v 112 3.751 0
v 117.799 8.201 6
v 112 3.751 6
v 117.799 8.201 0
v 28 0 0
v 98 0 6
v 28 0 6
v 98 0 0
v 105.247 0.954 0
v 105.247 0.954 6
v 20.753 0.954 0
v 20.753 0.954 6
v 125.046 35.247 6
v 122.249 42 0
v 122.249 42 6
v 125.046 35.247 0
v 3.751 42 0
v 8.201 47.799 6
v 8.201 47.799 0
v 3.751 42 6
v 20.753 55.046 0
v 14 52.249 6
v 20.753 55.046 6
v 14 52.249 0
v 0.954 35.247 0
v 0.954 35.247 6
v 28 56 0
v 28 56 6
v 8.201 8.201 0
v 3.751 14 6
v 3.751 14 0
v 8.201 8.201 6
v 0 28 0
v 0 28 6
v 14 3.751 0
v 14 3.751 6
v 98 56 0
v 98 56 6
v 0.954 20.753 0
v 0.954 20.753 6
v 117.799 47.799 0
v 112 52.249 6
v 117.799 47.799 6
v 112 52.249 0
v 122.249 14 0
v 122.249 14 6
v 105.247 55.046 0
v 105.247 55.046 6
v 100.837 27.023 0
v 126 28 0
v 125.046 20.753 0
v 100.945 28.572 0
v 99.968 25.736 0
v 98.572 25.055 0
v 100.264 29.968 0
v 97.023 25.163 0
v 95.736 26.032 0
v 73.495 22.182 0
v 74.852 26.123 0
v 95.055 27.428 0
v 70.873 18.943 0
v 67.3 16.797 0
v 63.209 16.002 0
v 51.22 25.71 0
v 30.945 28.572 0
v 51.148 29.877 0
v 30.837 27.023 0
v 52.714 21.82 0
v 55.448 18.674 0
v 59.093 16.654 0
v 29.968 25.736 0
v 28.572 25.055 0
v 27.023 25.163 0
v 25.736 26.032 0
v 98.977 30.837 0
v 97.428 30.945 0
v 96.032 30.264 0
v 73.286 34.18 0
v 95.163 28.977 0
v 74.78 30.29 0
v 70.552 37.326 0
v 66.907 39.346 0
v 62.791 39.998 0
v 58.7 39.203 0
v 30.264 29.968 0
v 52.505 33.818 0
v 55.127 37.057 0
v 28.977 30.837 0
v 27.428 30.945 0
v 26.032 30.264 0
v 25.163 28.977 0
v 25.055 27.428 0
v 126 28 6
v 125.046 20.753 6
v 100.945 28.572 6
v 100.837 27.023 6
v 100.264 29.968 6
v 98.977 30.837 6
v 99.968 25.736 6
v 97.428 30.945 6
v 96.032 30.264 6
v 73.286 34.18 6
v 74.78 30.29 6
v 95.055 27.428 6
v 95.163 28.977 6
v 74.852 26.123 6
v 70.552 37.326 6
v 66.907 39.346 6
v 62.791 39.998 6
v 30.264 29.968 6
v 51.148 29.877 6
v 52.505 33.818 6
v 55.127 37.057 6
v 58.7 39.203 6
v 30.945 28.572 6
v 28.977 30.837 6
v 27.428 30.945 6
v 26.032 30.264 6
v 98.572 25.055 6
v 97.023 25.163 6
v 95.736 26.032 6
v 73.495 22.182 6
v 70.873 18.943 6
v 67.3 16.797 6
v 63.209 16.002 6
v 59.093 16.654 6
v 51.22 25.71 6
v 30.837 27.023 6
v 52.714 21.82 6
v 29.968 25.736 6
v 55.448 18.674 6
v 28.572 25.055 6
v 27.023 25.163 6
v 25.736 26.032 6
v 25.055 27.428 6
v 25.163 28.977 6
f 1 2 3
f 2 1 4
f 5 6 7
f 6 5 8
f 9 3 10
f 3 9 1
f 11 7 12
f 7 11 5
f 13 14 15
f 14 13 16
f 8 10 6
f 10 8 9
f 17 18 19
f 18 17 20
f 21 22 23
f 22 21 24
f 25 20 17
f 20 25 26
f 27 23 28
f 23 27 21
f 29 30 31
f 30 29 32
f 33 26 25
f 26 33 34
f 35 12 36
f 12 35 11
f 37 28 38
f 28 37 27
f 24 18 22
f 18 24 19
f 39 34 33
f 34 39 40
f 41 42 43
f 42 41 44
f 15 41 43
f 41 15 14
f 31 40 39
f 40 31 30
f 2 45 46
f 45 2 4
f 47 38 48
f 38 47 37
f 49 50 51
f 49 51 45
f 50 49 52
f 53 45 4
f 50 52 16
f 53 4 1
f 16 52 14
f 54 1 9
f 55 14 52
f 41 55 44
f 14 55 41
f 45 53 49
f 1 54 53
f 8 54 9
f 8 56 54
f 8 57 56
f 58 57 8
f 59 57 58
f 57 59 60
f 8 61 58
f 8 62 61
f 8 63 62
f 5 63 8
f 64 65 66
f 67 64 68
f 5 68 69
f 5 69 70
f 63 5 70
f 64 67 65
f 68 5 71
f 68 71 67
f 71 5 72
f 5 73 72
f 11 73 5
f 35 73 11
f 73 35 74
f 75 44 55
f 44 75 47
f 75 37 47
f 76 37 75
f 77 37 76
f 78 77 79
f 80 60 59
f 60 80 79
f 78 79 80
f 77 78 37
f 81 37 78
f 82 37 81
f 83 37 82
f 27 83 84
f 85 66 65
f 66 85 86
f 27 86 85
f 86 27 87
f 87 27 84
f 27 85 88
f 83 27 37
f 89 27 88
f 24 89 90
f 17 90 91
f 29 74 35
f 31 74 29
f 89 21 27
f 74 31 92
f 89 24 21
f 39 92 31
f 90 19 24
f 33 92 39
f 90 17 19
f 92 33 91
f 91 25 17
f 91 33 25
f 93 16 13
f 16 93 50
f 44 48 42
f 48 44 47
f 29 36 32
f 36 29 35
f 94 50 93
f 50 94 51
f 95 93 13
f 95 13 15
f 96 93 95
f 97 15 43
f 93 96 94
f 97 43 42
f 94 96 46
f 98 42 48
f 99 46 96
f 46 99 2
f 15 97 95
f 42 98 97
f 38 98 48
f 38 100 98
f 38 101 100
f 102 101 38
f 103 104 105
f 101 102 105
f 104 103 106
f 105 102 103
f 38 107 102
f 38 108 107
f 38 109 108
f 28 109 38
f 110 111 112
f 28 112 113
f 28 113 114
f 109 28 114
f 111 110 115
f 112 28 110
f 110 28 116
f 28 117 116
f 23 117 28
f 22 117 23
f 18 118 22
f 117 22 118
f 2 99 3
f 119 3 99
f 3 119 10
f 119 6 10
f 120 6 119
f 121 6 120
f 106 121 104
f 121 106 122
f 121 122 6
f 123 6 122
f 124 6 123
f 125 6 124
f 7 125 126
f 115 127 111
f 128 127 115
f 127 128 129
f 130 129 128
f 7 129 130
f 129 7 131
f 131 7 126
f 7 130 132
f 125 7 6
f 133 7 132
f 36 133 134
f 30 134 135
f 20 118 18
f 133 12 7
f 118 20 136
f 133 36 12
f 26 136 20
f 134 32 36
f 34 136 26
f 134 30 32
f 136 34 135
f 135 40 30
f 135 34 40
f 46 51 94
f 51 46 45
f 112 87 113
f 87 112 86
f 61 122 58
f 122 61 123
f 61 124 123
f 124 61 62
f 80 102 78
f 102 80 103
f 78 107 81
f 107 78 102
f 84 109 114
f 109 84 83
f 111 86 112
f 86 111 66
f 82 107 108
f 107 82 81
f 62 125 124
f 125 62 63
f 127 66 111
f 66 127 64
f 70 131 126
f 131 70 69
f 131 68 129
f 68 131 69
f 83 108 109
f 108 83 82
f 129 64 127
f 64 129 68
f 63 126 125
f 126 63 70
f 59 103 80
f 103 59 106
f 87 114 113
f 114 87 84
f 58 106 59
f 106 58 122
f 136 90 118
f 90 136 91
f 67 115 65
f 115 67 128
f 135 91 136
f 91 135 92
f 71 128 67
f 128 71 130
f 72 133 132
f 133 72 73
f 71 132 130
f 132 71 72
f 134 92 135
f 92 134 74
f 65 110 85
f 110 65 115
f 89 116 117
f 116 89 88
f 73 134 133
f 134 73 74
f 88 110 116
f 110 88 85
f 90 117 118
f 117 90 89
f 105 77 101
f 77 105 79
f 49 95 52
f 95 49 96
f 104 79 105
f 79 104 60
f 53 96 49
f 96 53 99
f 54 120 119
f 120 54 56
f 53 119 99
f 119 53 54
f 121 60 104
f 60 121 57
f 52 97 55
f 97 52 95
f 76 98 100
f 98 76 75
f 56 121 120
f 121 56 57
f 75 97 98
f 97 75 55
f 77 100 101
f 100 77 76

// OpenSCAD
$fn = 32;

// ----------------------------------------------------------------------
// Spacer plate: obround span 70, caps R28
// ----------------------------------------------------------------------

// --- parameters (mm) ---
bore_r = 12;              // centre bore radius
bolt_r = 3;               // bolt hole radius
plate_t = 6;              // plate thickness, Z (extrusion height)
span = 70;                // obround span
cap_r = 28;               // cap radius

profile = [[28, 56], [20.753, 55.046], [14, 52.249], [8.201, 47.799], [3.751, 42], [0.954, 35.247], [0, 28], [0.954, 20.753], [3.751, 14], [8.201, 8.201], [14, 3.751], [20.753, 0.954], [28, 0], [98, 0], [105.247, 0.954], [112, 3.751], [117.799, 8.201], [122.249, 14], [125.046, 20.753], [126, 28], [125.046, 35.247], [122.249, 42], [117.799, 47.799], [112, 52.249], [105.247, 55.046], [98, 56]];  // primary outline, 26 points, counter clockwise
void_1 = [[74.78, 30.29], [73.286, 34.18], [70.552, 37.326], [66.907, 39.346], [62.791, 39.998], [58.7, 39.203], [55.127, 37.057], [52.505, 33.818], [51.148, 29.877], [51.22, 25.71], [52.714, 21.82], [55.448, 18.674], [59.093, 16.654], [63.209, 16.002], [67.3, 16.797], [70.873, 18.943], [73.495, 22.182], [74.852, 26.123]];  // centre bore, 18 points
void_2 = [[30.945, 28.572], [30.264, 29.968], [28.977, 30.837], [27.428, 30.945], [26.032, 30.264], [25.163, 28.977], [25.055, 27.428], [25.736, 26.032], [27.023, 25.163], [28.572, 25.055], [29.968, 25.736], [30.837, 27.023]];  // end hole, 12 points
void_3 = [[100.945, 28.572], [100.264, 29.968], [98.977, 30.837], [97.428, 30.945], [96.032, 30.264], [95.163, 28.977], [95.055, 27.428], [95.736, 26.032], [97.023, 25.163], [98.572, 25.055], [99.968, 25.736], [100.837, 27.023]];  // end hole, 12 points

// --- the one profile operation ---
difference() {
  linear_extrude(height = plate_t) polygon(points = profile);
  translate([0, 0, -1])
    linear_extrude(height = plate_t + 2) polygon(points = void_1);
  translate([0, 0, -1])
    linear_extrude(height = plate_t + 2) polygon(points = void_2);
  translate([0, 0, -1])
    linear_extrude(height = plate_t + 2) polygon(points = void_3);
}
